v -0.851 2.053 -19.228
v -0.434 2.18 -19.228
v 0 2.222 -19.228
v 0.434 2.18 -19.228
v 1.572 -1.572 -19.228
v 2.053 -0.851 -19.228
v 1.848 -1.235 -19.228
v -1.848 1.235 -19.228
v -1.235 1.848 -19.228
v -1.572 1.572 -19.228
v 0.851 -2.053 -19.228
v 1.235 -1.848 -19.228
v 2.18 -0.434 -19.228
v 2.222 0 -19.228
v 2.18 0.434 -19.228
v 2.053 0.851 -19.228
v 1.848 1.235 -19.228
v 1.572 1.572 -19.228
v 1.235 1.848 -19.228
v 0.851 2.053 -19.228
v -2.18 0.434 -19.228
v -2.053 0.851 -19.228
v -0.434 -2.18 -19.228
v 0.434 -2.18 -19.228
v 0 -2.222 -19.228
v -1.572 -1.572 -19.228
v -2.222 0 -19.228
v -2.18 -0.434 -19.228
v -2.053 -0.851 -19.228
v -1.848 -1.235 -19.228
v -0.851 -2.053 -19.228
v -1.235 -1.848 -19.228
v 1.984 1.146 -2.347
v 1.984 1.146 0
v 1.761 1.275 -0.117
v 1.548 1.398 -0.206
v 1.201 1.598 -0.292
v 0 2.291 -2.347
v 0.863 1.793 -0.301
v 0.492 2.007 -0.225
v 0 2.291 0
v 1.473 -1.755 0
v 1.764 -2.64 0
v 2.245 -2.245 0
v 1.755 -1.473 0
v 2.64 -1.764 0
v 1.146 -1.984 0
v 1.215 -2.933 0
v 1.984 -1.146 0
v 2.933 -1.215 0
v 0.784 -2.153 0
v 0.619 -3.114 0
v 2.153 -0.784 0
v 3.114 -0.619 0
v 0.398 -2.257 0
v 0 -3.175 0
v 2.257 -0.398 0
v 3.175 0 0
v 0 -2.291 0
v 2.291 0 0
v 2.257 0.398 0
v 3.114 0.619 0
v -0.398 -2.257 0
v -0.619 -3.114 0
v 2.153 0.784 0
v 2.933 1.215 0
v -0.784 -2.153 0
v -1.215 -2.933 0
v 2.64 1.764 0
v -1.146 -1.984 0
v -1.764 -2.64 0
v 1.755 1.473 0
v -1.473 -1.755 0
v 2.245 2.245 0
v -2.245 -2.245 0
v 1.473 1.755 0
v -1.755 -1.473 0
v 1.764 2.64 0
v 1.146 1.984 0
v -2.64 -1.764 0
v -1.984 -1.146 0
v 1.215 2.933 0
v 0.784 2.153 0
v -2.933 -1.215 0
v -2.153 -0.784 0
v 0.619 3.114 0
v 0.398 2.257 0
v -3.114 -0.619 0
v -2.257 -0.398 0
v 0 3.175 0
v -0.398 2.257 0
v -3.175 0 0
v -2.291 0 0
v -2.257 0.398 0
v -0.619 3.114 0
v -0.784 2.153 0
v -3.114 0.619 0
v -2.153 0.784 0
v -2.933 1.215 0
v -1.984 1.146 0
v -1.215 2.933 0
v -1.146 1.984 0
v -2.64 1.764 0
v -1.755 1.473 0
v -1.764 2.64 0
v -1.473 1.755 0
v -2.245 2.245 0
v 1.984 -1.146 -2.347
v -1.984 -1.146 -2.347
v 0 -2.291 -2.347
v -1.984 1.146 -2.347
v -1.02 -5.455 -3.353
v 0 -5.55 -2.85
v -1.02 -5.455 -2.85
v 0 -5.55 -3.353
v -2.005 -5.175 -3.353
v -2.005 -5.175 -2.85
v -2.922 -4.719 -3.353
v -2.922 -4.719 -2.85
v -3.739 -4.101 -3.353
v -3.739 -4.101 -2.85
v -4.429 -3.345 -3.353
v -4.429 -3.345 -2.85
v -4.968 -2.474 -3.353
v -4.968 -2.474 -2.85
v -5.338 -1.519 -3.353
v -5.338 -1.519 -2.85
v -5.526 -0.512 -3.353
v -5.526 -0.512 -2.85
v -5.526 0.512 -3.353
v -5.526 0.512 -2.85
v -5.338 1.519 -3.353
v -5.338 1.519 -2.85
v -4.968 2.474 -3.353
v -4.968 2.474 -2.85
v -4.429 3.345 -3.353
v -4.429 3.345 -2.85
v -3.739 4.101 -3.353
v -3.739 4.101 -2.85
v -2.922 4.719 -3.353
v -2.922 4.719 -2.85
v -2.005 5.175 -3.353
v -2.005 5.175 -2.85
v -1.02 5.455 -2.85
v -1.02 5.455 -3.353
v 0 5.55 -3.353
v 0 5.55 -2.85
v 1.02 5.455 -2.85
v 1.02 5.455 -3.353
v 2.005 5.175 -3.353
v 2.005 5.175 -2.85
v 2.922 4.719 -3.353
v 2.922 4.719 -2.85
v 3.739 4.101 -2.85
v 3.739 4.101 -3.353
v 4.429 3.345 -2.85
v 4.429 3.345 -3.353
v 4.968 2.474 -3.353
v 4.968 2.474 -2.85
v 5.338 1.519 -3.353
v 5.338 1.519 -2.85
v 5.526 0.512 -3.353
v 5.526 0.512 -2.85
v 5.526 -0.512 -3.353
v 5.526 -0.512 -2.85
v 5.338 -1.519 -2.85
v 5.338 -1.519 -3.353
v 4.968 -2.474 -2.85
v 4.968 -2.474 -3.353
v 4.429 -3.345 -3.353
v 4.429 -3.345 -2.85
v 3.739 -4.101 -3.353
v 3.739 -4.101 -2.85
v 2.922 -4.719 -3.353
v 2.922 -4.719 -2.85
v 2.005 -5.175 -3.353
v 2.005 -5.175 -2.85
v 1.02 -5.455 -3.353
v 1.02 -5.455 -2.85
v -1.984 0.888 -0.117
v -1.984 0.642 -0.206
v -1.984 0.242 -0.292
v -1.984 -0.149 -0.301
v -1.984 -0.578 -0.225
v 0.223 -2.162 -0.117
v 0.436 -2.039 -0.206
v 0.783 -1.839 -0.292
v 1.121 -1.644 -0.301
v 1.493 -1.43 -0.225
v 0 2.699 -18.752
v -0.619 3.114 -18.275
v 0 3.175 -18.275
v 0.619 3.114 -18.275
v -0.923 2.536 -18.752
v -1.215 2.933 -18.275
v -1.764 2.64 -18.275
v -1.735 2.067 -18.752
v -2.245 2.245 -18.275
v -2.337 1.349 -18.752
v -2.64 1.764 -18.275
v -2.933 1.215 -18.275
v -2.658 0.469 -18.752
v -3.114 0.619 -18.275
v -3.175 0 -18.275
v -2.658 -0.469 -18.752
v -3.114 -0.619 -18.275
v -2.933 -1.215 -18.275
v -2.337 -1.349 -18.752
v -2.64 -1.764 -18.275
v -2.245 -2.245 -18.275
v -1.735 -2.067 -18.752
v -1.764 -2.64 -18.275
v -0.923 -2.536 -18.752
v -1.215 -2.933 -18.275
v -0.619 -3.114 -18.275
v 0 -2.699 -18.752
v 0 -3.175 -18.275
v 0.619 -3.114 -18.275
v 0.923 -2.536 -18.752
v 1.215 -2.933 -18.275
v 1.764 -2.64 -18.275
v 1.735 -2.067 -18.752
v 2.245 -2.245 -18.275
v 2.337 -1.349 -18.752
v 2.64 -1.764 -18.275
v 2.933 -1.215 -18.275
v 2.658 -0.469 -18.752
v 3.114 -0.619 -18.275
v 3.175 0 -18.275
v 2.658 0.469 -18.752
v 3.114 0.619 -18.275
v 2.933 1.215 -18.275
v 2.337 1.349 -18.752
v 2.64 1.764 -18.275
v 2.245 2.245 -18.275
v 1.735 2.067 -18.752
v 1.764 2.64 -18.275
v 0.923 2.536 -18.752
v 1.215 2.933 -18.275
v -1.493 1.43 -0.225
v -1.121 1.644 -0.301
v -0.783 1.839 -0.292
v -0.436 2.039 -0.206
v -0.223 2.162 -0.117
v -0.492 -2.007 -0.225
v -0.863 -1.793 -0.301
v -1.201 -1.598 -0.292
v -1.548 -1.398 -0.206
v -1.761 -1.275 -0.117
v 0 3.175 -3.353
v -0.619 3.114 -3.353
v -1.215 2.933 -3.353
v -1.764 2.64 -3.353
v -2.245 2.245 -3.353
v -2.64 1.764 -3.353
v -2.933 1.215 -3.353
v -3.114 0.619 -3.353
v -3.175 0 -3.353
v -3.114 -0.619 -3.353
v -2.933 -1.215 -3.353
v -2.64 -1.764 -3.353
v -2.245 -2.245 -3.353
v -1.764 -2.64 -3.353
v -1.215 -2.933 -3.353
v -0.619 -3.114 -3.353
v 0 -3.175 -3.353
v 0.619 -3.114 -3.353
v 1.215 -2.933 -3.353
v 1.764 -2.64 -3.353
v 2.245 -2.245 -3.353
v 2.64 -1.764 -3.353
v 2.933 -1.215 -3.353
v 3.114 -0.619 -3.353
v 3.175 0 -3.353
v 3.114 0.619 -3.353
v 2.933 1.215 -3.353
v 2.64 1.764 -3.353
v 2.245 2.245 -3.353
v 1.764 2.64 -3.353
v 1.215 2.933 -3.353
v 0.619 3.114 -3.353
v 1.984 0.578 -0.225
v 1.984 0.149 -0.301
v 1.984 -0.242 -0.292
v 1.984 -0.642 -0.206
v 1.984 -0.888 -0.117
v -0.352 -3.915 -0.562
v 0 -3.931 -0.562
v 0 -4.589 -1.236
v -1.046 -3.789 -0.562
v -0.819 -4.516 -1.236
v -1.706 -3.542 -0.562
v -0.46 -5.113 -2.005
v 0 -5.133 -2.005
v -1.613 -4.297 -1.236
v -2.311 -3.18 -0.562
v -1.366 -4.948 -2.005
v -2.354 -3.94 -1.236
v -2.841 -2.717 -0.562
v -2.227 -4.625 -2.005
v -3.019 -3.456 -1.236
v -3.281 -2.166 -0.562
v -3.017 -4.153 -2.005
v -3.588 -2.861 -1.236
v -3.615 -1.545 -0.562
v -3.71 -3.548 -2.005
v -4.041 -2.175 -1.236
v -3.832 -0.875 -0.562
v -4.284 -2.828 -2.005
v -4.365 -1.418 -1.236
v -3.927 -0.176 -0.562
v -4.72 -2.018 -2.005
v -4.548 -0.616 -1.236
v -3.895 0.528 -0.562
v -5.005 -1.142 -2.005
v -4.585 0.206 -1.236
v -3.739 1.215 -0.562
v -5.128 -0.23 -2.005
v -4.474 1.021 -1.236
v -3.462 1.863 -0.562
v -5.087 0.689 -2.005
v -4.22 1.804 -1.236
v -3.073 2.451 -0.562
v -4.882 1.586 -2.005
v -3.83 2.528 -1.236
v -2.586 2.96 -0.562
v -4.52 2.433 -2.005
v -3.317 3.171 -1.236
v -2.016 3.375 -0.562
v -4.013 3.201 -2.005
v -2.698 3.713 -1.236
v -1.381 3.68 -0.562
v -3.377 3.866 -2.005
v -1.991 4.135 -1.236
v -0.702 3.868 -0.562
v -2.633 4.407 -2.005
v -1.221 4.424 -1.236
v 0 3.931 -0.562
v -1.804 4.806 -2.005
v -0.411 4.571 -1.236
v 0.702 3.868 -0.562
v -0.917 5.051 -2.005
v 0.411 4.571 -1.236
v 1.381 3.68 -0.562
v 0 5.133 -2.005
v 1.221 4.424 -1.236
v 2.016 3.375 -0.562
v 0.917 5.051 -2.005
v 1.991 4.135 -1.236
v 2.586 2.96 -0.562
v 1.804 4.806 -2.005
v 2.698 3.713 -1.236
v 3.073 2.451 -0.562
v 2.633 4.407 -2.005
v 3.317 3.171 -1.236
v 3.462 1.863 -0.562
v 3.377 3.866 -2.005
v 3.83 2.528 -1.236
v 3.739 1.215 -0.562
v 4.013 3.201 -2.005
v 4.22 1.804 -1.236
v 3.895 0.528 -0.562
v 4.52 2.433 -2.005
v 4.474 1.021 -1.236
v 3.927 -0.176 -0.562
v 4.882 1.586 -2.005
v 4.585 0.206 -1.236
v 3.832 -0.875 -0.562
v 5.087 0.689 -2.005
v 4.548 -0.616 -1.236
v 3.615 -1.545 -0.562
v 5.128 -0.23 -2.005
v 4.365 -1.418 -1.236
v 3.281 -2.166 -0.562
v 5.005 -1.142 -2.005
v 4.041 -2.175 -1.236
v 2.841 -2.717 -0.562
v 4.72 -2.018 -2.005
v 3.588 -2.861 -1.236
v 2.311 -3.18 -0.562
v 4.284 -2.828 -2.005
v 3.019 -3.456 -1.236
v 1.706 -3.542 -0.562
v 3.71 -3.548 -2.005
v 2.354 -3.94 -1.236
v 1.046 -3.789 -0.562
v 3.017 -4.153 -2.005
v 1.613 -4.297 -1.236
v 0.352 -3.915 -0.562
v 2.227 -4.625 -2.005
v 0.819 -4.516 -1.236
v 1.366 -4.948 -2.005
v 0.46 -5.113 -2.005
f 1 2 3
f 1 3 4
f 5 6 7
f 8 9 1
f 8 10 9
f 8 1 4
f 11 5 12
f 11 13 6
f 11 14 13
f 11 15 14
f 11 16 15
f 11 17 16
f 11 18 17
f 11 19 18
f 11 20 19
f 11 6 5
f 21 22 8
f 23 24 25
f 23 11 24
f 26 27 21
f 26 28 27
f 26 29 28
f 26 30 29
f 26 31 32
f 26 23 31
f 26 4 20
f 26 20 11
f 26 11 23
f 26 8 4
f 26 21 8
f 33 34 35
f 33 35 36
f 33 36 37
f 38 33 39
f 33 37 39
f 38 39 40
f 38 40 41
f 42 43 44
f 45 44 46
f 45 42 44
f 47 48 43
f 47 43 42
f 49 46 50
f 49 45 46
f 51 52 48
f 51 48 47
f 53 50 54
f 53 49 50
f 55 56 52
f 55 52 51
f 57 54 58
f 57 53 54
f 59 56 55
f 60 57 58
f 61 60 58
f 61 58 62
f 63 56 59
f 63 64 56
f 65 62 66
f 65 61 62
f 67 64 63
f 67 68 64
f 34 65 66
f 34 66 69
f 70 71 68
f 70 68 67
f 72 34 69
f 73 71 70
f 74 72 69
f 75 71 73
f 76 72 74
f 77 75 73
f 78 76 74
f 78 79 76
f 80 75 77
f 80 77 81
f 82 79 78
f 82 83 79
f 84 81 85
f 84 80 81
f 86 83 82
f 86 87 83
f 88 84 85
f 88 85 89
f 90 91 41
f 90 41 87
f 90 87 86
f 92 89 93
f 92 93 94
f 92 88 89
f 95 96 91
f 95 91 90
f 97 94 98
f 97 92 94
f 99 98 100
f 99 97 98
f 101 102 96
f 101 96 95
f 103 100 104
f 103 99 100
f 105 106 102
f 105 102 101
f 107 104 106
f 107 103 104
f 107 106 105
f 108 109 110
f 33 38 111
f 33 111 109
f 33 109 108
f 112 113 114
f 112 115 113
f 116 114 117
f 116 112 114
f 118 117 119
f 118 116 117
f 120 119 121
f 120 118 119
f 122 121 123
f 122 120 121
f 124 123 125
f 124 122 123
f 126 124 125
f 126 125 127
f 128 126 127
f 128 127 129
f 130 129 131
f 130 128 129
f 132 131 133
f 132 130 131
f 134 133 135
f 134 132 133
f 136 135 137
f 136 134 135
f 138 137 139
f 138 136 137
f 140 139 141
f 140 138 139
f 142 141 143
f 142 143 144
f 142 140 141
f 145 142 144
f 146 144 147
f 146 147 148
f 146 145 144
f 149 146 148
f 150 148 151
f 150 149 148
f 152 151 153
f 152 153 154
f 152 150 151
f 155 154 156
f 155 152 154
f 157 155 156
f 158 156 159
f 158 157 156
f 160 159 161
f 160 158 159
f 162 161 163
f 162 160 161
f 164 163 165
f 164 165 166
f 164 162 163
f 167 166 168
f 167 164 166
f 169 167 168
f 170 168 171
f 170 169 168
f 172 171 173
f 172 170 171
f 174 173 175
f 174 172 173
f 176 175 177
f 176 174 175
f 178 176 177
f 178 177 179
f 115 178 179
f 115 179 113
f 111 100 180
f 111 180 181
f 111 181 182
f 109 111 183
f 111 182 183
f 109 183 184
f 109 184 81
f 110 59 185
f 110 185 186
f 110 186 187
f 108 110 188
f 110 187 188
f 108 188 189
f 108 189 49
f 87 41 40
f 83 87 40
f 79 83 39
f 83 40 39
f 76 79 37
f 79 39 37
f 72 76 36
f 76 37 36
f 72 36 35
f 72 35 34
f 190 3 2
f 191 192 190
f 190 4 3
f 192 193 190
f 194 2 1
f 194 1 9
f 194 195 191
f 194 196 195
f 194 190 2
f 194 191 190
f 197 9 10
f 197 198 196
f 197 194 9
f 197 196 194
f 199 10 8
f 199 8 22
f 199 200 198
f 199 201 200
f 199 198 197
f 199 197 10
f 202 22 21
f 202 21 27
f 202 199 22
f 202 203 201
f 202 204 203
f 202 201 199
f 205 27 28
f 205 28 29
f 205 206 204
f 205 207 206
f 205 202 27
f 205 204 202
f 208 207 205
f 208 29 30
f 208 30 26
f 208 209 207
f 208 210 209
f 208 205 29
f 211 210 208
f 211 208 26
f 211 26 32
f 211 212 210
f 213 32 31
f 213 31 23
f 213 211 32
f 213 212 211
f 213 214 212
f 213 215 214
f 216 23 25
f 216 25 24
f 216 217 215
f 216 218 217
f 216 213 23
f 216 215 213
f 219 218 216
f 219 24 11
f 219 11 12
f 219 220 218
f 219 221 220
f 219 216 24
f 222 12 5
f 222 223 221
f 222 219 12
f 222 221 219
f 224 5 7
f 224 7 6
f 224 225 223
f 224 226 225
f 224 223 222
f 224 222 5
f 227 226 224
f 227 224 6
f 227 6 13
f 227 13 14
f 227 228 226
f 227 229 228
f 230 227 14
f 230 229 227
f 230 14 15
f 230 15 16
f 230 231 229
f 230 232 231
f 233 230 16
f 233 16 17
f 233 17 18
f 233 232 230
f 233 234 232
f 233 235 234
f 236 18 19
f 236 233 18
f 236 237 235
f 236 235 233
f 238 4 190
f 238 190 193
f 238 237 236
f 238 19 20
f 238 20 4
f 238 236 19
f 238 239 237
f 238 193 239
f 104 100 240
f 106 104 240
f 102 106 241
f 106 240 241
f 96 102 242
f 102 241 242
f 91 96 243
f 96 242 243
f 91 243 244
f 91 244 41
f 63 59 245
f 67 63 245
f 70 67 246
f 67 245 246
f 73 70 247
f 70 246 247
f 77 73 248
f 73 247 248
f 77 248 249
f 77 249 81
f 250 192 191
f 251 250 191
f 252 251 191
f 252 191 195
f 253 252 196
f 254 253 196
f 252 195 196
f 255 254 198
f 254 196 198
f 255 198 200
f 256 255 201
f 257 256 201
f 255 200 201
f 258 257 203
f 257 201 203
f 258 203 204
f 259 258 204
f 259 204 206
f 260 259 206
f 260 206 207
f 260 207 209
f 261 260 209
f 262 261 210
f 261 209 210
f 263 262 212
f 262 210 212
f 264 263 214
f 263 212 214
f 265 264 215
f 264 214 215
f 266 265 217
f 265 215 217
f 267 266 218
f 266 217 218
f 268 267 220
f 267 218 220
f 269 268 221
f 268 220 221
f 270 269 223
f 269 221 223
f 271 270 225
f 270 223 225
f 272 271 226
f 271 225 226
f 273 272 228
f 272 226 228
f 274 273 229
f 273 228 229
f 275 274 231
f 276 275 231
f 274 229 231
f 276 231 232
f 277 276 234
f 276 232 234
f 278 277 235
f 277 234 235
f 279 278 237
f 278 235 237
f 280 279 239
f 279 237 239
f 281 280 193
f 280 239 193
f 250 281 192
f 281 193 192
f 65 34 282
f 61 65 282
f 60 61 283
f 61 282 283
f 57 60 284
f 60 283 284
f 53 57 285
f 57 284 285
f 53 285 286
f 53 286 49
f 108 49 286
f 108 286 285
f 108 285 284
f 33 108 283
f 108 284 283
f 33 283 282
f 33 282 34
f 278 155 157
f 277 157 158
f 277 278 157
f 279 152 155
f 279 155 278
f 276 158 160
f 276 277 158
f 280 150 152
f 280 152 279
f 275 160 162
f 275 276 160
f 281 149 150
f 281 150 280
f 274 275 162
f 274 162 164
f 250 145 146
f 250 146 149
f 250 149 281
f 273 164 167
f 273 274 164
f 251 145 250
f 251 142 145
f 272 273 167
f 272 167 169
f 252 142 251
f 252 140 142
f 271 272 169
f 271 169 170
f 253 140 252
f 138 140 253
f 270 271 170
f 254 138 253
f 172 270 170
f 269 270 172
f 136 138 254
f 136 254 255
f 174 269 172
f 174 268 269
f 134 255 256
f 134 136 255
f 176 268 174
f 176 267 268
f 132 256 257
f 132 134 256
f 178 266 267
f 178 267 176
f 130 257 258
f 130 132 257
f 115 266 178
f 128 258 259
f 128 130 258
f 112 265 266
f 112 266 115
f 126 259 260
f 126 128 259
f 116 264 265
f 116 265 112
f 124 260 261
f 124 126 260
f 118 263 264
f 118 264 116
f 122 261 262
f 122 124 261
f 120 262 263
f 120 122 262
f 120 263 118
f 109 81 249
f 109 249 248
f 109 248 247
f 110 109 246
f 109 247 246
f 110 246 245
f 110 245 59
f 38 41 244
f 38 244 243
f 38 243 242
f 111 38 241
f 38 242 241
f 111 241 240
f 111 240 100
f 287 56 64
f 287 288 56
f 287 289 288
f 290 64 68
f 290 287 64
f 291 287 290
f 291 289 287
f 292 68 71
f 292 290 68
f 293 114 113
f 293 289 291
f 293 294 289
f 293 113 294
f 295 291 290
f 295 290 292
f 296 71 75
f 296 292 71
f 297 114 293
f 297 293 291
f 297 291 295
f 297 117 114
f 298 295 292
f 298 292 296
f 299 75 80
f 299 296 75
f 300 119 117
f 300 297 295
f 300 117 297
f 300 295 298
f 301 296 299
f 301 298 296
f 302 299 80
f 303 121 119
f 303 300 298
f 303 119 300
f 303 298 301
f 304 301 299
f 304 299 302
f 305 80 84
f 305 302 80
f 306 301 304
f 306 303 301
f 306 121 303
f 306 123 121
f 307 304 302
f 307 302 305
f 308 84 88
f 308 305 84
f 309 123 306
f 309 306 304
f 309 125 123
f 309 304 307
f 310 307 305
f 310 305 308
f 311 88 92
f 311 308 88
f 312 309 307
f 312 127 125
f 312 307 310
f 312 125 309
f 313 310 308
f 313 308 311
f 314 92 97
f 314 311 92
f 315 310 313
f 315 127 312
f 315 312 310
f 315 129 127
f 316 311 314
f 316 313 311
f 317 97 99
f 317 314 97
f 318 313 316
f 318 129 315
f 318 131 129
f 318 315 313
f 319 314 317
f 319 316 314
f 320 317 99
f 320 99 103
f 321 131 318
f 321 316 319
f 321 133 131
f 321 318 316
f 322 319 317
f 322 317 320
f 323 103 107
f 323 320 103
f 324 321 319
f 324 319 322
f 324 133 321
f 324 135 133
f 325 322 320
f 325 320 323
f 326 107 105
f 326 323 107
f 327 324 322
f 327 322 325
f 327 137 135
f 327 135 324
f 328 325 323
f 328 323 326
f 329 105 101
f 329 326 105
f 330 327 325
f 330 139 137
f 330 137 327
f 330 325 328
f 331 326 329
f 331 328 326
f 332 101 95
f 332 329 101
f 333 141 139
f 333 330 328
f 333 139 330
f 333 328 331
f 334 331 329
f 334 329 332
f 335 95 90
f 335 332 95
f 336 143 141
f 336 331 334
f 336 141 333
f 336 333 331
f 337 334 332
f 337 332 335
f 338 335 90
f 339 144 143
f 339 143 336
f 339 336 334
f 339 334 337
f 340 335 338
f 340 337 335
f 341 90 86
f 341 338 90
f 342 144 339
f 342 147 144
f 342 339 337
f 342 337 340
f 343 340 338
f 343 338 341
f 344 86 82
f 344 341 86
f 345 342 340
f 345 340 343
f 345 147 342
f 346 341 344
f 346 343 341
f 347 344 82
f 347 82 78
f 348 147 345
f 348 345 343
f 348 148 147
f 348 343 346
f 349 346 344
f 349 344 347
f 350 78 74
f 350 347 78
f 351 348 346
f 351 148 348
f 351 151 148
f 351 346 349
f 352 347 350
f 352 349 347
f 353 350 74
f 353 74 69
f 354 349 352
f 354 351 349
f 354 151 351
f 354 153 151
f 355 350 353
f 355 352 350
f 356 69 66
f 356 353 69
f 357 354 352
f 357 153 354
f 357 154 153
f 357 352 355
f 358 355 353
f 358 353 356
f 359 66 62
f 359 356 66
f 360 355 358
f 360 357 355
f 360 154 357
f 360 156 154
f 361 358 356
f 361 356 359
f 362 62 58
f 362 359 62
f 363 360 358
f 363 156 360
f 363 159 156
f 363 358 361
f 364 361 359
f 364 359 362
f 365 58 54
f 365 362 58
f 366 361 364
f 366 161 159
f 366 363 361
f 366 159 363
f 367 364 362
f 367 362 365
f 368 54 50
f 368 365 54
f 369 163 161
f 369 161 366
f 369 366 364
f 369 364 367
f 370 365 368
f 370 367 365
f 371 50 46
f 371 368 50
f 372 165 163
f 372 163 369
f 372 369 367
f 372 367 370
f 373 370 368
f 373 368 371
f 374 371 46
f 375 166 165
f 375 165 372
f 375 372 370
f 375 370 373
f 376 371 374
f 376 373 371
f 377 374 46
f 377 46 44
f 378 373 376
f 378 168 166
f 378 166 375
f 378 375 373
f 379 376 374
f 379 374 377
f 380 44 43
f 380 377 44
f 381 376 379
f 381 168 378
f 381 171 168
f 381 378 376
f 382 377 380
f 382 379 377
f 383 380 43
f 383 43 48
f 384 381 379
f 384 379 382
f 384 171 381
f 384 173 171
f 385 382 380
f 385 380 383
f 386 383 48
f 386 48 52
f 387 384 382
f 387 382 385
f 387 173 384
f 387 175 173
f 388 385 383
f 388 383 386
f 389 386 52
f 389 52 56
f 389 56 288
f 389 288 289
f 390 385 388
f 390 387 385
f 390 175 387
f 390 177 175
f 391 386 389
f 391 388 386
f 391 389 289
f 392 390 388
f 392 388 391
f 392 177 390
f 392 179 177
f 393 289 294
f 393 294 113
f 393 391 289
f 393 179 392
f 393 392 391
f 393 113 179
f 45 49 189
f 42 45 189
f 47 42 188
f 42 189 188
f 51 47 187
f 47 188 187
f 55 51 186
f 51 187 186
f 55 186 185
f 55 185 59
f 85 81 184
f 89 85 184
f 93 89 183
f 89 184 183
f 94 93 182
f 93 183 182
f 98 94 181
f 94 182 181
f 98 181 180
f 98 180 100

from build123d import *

# Parameters (mm, degrees)
SKETCH1_W          = 15.875
SKETCH1_H          = 3.175
CHAMFER1_SIZE      = 0.9525
CUT_EXTRUDE2_DEPTH = 2.34696


with BuildPart() as part:
    # Sketch1 → Revolve1 (revolve)
    with BuildSketch(Plane(origin=(0, 0, 0), x_dir=(0, 0, -1), z_dir=(1, 0, 0))):
        with Locations((11.2903, 1.5875)):
            Rectangle(SKETCH1_W, SKETCH1_H)
    revolve(axis=Axis((0, 0, -19.2278), (0, 0, 1)))

    # Chamfer1
    chamfer1_edges = [part.edges().sort_by_distance(p)[0] for p in [
        (0, -3.175, -19.2278),
    ]]
    chamfer(chamfer1_edges, length=CHAMFER1_SIZE)

    # Sketch7 → Revolve2 (revolve)
    with BuildSketch(Plane(origin=(0, 0, 0), x_dir=(0, 0, -1), z_dir=(1, 0, 0))):
        with BuildLine():
            Line((2.84988, 5.5499), (3.3528, 5.5499))
            Line((3.3528, 5.5499), (3.3528, 0))
            Line((3.3528, 0), (0, 0))
            Line((0, 0), (0, 3.175))
            ThreePointArc((0, 3.175), (1.235921075, 4.58927271), (2.84988, 5.5499))
        make_face()
    revolve(axis=Axis((0, 0, 0), (0, 0, -1)))

    # Sketch5 → Cut-Extrude2 (cut)
    with BuildSketch(Plane.XY):
        Polygon((1.984375, -1.14567944), (1.984375, 1.14567944), (0, 2.291358881), (-1.984375, 1.14567944), (-1.984375, -1.14567944), (0, -2.291358881), align=None)
    extrude(amount=-CUT_EXTRUDE2_DEPTH, mode=Mode.SUBTRACT)

    # Cut-Extrude3 cone 1 section (through the dimple's axis) → Cut-Extrude3 (revolve, cut)
    with BuildSketch(Plane(origin=(0, 0, 0), x_dir=(0, -1, 0), z_dir=(1, 0, 0))):
        Polygon((0, 0), (2.291358881, 0), (0, 2.291358881), align=None)
    revolve(axis=Axis((0, 0, 0), (0, 0, -1)), mode=Mode.SUBTRACT)


solid = part.part
